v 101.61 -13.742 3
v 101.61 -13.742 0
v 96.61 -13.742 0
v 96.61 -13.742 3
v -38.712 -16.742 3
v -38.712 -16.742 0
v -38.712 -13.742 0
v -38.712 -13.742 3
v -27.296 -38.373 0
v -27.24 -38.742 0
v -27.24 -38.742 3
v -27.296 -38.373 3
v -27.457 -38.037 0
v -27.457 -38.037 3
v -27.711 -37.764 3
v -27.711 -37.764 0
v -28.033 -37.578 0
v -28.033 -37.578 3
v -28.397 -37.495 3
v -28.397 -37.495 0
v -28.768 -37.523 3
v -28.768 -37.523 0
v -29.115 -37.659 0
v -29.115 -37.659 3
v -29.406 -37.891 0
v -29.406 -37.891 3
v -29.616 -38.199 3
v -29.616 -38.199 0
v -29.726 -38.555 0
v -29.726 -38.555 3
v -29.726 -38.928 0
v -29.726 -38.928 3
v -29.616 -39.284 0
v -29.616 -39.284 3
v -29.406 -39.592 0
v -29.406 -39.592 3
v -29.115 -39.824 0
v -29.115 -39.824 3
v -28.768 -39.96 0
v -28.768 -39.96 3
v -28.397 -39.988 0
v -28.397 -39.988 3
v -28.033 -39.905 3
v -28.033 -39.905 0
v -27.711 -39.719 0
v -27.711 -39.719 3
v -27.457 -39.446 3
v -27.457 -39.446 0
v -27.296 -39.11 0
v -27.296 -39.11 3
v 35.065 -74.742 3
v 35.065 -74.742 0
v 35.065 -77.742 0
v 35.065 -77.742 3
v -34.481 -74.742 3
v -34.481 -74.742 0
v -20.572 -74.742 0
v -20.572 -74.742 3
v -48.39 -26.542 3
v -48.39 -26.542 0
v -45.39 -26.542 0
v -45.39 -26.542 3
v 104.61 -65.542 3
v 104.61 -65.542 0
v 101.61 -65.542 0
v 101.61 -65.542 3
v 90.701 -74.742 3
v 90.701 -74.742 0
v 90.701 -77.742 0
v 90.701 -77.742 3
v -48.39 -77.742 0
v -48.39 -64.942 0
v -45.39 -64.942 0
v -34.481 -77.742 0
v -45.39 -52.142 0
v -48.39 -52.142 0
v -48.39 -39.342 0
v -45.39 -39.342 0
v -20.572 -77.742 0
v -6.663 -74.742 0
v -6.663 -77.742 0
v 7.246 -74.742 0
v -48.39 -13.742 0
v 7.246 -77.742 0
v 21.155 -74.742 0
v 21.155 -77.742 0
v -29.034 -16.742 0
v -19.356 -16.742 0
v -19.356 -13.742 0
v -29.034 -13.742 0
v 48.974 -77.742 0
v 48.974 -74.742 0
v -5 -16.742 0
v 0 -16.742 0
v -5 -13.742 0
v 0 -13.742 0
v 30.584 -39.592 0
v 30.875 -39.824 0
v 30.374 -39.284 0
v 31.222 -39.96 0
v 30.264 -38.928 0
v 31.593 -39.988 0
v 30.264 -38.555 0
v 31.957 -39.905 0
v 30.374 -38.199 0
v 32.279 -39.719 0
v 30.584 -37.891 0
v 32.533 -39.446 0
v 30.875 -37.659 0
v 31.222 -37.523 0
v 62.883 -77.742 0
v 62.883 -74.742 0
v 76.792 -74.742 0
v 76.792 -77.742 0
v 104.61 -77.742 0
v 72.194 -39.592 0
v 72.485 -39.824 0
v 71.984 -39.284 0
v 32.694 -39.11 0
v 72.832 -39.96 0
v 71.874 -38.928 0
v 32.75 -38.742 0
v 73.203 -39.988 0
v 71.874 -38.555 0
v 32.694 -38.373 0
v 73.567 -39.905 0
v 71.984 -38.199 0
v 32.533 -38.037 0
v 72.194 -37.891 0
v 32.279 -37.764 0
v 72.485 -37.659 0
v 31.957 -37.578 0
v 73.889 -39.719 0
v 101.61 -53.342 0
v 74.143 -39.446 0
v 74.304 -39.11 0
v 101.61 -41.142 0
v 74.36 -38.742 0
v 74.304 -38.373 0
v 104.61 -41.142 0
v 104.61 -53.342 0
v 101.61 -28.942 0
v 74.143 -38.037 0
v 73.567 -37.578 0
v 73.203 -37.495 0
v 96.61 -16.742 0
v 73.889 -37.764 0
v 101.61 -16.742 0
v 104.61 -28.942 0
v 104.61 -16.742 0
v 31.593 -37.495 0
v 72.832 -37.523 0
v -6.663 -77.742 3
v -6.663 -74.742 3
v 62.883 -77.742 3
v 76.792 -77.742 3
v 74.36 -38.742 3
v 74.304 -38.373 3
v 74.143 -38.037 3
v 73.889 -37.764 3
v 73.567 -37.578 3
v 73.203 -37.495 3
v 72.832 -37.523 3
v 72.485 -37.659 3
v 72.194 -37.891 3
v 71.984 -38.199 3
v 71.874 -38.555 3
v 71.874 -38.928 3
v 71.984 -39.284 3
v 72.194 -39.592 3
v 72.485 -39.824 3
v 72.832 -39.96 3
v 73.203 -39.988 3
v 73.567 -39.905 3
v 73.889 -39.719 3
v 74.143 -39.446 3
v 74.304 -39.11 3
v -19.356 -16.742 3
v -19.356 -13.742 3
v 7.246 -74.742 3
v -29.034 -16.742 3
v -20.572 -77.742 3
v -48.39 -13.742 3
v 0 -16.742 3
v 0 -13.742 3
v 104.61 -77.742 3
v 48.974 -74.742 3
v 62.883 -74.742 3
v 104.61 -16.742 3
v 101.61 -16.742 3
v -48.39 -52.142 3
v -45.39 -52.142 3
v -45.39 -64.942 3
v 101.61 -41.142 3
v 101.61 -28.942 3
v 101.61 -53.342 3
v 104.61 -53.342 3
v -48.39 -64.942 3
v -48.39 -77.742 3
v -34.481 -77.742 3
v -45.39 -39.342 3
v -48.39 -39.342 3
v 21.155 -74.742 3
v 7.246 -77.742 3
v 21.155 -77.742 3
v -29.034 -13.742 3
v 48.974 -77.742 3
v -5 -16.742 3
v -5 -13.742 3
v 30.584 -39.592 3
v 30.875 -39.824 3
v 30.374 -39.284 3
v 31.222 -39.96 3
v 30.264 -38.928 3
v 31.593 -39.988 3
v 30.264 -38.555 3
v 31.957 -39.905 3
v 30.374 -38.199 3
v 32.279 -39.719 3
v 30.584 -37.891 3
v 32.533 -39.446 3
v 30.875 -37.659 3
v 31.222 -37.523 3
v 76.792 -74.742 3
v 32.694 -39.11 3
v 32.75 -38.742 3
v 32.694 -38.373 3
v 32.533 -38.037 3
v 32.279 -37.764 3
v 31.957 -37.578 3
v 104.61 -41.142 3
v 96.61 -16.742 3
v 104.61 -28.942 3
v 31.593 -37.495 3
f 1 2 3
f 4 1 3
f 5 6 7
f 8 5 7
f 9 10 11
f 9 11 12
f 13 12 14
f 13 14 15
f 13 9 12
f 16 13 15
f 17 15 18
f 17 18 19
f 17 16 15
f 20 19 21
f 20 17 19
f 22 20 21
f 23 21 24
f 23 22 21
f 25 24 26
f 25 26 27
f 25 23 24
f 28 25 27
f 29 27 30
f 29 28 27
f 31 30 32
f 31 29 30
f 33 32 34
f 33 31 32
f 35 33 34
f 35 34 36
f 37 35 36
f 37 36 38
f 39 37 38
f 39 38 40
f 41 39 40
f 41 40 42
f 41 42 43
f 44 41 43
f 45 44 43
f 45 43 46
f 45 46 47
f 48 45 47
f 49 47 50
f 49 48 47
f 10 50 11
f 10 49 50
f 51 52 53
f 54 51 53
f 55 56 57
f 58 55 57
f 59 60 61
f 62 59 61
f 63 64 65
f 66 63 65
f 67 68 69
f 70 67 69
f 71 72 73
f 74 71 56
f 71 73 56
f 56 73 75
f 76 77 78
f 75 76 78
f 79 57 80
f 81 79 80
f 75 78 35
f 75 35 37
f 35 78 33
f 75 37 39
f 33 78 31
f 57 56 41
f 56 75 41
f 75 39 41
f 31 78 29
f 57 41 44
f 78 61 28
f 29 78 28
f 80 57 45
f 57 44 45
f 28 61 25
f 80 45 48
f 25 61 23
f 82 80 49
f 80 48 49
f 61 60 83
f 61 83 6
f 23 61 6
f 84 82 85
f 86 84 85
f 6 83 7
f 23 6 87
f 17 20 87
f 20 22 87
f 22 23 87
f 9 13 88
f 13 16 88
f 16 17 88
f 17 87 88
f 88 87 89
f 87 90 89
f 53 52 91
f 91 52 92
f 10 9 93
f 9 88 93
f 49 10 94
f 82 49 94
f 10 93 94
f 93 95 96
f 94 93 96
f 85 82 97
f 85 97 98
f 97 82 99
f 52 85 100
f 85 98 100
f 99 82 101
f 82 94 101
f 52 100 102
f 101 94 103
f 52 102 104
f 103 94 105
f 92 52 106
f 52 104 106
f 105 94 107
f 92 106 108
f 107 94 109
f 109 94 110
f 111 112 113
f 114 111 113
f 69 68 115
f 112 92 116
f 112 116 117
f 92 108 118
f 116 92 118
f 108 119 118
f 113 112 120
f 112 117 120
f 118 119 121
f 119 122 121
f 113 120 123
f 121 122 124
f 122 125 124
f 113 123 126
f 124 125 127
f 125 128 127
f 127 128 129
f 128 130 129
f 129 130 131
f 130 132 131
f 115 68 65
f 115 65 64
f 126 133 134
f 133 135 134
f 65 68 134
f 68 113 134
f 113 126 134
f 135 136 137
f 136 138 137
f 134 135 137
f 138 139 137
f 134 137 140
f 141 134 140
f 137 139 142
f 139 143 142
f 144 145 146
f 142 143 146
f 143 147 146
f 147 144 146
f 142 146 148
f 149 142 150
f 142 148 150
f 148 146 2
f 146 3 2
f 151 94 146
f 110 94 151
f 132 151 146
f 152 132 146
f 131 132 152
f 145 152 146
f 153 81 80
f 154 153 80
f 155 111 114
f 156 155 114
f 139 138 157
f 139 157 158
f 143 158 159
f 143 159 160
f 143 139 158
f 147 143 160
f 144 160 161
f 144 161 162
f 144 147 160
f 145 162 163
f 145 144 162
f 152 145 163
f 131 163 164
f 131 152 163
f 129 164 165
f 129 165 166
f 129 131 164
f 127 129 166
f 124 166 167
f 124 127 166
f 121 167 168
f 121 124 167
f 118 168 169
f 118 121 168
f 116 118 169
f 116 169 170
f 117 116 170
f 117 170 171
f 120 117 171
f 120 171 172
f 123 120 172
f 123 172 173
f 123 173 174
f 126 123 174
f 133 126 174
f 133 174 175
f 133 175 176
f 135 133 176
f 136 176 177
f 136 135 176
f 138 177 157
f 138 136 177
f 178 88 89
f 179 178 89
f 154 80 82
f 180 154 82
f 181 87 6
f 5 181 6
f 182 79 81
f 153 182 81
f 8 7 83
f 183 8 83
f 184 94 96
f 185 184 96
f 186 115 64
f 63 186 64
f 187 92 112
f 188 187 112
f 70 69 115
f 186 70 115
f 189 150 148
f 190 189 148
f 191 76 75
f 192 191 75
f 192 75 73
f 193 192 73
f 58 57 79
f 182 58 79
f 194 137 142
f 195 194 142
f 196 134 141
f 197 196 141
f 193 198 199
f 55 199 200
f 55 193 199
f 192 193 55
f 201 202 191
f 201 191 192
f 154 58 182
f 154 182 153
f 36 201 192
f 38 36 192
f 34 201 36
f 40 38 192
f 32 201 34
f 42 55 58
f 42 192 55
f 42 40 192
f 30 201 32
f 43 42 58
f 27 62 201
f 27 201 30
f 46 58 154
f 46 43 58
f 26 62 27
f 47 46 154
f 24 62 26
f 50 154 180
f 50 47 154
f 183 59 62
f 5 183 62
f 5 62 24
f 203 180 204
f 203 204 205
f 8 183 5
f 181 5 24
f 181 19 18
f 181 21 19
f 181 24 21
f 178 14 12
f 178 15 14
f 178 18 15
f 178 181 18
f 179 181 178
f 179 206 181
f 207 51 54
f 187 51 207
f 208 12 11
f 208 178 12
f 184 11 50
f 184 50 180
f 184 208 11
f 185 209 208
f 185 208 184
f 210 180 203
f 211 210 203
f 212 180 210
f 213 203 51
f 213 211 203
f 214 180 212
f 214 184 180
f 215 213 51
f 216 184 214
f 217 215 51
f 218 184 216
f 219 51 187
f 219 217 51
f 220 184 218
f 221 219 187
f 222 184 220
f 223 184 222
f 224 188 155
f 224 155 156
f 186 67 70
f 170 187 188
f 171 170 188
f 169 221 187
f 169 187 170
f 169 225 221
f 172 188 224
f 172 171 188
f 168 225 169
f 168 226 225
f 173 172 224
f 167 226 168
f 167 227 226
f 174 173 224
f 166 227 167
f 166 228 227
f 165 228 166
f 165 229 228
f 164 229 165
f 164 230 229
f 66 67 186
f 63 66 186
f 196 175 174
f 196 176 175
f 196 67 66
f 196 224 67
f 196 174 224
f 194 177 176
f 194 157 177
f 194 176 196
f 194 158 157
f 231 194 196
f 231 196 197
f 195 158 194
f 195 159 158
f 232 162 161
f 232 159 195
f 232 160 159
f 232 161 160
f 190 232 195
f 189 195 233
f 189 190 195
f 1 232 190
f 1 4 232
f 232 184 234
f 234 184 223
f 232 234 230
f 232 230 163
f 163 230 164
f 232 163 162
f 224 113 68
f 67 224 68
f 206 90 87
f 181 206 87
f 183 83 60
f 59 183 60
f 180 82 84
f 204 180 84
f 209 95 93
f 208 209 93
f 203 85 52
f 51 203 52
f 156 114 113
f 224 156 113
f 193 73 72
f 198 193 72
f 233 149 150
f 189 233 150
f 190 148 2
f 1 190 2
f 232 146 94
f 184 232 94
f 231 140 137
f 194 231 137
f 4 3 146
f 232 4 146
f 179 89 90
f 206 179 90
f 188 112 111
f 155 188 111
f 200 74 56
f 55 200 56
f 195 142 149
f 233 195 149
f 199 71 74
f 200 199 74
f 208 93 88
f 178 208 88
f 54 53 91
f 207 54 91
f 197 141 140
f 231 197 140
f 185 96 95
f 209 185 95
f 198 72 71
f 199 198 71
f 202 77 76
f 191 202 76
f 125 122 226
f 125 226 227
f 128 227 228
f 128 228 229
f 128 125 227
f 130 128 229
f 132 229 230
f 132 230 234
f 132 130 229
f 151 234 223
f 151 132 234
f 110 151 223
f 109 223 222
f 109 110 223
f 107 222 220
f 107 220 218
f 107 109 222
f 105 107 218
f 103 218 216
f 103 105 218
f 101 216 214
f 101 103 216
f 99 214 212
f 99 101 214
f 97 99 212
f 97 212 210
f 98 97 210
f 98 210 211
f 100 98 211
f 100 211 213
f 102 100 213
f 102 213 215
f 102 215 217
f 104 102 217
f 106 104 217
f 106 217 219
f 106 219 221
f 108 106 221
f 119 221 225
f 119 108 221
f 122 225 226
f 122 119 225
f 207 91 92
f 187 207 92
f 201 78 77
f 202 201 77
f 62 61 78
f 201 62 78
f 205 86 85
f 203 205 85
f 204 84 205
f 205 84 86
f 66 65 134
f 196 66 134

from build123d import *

# Parameters (mm, degrees)
CROQUIS1_R              = 1.25
SALIENTE_EXTRUIR1_DEPTH = 3


with BuildPart() as part:
    # Croquis1 → Saliente-Extruir1 (new body)
    with BuildSketch(Plane.XY):
        Polygon((96.61, -16.741574692), (0, -16.741574692), (0, -13.741574692), (-5, -13.741574692), (-5, -16.741574692), (-9.678, -16.741574692), (-19.356, -16.741574692), (-19.356, -13.741574692), (-29.034, -13.741574692), (-29.034, -16.741574692), (-38.712, -16.741574692), (-38.712, -13.741574692), (-48.39, -13.741574692), (-48.39, -26.541574692), (-45.39, -26.541574692), (-45.39, -39.341574692), (-48.39, -39.341574692), (-48.39, -52.141574692), (-45.39, -52.141574692), (-45.39, -64.941574692), (-48.39, -64.941574692), (-48.39, -77.741574692), (-34.480909091, -77.741574692), (-34.480909091, -74.741574692), (-20.571818182, -74.741574692), (-20.571818182, -77.741574692), (-6.662727273, -77.741574692), (-6.662727273, -74.741574692), (7.246363636, -74.741574692), (7.246363636, -77.741574692), (21.155454545, -77.741574692), (21.155454545, -74.741574692), (35.064545455, -74.741574692), (35.064545455, -77.741574692), (48.973636364, -77.741574692), (48.973636364, -74.741574692), (62.882727273, -74.741574692), (62.882727273, -77.741574692), (76.791818182, -77.741574692), (76.791818182, -74.741574692), (90.700909091, -74.741574692), (90.700909091, -77.741574692), (104.61, -77.741574692), (104.61, -65.541574692), (101.61, -65.541574692), (101.61, -53.341574692), (104.61, -53.341574692), (104.61, -41.141574692), (101.61, -41.141574692), (101.61, -28.941574692), (104.61, -28.941574692), (104.61, -16.741574692), (101.61, -16.741574692), (101.61, -13.741574692), (96.61, -13.741574692), align=None)
        with Locations((-28.49, -38.741574692)):
            Circle(CROQUIS1_R, mode=Mode.SUBTRACT)
        with Locations((31.5, -38.741574692)):
            Circle(CROQUIS1_R, mode=Mode.SUBTRACT)
        with Locations((73.11, -38.741574692)):
            Circle(CROQUIS1_R, mode=Mode.SUBTRACT)
    extrude(amount=SALIENTE_EXTRUIR1_DEPTH)


solid = part.part
